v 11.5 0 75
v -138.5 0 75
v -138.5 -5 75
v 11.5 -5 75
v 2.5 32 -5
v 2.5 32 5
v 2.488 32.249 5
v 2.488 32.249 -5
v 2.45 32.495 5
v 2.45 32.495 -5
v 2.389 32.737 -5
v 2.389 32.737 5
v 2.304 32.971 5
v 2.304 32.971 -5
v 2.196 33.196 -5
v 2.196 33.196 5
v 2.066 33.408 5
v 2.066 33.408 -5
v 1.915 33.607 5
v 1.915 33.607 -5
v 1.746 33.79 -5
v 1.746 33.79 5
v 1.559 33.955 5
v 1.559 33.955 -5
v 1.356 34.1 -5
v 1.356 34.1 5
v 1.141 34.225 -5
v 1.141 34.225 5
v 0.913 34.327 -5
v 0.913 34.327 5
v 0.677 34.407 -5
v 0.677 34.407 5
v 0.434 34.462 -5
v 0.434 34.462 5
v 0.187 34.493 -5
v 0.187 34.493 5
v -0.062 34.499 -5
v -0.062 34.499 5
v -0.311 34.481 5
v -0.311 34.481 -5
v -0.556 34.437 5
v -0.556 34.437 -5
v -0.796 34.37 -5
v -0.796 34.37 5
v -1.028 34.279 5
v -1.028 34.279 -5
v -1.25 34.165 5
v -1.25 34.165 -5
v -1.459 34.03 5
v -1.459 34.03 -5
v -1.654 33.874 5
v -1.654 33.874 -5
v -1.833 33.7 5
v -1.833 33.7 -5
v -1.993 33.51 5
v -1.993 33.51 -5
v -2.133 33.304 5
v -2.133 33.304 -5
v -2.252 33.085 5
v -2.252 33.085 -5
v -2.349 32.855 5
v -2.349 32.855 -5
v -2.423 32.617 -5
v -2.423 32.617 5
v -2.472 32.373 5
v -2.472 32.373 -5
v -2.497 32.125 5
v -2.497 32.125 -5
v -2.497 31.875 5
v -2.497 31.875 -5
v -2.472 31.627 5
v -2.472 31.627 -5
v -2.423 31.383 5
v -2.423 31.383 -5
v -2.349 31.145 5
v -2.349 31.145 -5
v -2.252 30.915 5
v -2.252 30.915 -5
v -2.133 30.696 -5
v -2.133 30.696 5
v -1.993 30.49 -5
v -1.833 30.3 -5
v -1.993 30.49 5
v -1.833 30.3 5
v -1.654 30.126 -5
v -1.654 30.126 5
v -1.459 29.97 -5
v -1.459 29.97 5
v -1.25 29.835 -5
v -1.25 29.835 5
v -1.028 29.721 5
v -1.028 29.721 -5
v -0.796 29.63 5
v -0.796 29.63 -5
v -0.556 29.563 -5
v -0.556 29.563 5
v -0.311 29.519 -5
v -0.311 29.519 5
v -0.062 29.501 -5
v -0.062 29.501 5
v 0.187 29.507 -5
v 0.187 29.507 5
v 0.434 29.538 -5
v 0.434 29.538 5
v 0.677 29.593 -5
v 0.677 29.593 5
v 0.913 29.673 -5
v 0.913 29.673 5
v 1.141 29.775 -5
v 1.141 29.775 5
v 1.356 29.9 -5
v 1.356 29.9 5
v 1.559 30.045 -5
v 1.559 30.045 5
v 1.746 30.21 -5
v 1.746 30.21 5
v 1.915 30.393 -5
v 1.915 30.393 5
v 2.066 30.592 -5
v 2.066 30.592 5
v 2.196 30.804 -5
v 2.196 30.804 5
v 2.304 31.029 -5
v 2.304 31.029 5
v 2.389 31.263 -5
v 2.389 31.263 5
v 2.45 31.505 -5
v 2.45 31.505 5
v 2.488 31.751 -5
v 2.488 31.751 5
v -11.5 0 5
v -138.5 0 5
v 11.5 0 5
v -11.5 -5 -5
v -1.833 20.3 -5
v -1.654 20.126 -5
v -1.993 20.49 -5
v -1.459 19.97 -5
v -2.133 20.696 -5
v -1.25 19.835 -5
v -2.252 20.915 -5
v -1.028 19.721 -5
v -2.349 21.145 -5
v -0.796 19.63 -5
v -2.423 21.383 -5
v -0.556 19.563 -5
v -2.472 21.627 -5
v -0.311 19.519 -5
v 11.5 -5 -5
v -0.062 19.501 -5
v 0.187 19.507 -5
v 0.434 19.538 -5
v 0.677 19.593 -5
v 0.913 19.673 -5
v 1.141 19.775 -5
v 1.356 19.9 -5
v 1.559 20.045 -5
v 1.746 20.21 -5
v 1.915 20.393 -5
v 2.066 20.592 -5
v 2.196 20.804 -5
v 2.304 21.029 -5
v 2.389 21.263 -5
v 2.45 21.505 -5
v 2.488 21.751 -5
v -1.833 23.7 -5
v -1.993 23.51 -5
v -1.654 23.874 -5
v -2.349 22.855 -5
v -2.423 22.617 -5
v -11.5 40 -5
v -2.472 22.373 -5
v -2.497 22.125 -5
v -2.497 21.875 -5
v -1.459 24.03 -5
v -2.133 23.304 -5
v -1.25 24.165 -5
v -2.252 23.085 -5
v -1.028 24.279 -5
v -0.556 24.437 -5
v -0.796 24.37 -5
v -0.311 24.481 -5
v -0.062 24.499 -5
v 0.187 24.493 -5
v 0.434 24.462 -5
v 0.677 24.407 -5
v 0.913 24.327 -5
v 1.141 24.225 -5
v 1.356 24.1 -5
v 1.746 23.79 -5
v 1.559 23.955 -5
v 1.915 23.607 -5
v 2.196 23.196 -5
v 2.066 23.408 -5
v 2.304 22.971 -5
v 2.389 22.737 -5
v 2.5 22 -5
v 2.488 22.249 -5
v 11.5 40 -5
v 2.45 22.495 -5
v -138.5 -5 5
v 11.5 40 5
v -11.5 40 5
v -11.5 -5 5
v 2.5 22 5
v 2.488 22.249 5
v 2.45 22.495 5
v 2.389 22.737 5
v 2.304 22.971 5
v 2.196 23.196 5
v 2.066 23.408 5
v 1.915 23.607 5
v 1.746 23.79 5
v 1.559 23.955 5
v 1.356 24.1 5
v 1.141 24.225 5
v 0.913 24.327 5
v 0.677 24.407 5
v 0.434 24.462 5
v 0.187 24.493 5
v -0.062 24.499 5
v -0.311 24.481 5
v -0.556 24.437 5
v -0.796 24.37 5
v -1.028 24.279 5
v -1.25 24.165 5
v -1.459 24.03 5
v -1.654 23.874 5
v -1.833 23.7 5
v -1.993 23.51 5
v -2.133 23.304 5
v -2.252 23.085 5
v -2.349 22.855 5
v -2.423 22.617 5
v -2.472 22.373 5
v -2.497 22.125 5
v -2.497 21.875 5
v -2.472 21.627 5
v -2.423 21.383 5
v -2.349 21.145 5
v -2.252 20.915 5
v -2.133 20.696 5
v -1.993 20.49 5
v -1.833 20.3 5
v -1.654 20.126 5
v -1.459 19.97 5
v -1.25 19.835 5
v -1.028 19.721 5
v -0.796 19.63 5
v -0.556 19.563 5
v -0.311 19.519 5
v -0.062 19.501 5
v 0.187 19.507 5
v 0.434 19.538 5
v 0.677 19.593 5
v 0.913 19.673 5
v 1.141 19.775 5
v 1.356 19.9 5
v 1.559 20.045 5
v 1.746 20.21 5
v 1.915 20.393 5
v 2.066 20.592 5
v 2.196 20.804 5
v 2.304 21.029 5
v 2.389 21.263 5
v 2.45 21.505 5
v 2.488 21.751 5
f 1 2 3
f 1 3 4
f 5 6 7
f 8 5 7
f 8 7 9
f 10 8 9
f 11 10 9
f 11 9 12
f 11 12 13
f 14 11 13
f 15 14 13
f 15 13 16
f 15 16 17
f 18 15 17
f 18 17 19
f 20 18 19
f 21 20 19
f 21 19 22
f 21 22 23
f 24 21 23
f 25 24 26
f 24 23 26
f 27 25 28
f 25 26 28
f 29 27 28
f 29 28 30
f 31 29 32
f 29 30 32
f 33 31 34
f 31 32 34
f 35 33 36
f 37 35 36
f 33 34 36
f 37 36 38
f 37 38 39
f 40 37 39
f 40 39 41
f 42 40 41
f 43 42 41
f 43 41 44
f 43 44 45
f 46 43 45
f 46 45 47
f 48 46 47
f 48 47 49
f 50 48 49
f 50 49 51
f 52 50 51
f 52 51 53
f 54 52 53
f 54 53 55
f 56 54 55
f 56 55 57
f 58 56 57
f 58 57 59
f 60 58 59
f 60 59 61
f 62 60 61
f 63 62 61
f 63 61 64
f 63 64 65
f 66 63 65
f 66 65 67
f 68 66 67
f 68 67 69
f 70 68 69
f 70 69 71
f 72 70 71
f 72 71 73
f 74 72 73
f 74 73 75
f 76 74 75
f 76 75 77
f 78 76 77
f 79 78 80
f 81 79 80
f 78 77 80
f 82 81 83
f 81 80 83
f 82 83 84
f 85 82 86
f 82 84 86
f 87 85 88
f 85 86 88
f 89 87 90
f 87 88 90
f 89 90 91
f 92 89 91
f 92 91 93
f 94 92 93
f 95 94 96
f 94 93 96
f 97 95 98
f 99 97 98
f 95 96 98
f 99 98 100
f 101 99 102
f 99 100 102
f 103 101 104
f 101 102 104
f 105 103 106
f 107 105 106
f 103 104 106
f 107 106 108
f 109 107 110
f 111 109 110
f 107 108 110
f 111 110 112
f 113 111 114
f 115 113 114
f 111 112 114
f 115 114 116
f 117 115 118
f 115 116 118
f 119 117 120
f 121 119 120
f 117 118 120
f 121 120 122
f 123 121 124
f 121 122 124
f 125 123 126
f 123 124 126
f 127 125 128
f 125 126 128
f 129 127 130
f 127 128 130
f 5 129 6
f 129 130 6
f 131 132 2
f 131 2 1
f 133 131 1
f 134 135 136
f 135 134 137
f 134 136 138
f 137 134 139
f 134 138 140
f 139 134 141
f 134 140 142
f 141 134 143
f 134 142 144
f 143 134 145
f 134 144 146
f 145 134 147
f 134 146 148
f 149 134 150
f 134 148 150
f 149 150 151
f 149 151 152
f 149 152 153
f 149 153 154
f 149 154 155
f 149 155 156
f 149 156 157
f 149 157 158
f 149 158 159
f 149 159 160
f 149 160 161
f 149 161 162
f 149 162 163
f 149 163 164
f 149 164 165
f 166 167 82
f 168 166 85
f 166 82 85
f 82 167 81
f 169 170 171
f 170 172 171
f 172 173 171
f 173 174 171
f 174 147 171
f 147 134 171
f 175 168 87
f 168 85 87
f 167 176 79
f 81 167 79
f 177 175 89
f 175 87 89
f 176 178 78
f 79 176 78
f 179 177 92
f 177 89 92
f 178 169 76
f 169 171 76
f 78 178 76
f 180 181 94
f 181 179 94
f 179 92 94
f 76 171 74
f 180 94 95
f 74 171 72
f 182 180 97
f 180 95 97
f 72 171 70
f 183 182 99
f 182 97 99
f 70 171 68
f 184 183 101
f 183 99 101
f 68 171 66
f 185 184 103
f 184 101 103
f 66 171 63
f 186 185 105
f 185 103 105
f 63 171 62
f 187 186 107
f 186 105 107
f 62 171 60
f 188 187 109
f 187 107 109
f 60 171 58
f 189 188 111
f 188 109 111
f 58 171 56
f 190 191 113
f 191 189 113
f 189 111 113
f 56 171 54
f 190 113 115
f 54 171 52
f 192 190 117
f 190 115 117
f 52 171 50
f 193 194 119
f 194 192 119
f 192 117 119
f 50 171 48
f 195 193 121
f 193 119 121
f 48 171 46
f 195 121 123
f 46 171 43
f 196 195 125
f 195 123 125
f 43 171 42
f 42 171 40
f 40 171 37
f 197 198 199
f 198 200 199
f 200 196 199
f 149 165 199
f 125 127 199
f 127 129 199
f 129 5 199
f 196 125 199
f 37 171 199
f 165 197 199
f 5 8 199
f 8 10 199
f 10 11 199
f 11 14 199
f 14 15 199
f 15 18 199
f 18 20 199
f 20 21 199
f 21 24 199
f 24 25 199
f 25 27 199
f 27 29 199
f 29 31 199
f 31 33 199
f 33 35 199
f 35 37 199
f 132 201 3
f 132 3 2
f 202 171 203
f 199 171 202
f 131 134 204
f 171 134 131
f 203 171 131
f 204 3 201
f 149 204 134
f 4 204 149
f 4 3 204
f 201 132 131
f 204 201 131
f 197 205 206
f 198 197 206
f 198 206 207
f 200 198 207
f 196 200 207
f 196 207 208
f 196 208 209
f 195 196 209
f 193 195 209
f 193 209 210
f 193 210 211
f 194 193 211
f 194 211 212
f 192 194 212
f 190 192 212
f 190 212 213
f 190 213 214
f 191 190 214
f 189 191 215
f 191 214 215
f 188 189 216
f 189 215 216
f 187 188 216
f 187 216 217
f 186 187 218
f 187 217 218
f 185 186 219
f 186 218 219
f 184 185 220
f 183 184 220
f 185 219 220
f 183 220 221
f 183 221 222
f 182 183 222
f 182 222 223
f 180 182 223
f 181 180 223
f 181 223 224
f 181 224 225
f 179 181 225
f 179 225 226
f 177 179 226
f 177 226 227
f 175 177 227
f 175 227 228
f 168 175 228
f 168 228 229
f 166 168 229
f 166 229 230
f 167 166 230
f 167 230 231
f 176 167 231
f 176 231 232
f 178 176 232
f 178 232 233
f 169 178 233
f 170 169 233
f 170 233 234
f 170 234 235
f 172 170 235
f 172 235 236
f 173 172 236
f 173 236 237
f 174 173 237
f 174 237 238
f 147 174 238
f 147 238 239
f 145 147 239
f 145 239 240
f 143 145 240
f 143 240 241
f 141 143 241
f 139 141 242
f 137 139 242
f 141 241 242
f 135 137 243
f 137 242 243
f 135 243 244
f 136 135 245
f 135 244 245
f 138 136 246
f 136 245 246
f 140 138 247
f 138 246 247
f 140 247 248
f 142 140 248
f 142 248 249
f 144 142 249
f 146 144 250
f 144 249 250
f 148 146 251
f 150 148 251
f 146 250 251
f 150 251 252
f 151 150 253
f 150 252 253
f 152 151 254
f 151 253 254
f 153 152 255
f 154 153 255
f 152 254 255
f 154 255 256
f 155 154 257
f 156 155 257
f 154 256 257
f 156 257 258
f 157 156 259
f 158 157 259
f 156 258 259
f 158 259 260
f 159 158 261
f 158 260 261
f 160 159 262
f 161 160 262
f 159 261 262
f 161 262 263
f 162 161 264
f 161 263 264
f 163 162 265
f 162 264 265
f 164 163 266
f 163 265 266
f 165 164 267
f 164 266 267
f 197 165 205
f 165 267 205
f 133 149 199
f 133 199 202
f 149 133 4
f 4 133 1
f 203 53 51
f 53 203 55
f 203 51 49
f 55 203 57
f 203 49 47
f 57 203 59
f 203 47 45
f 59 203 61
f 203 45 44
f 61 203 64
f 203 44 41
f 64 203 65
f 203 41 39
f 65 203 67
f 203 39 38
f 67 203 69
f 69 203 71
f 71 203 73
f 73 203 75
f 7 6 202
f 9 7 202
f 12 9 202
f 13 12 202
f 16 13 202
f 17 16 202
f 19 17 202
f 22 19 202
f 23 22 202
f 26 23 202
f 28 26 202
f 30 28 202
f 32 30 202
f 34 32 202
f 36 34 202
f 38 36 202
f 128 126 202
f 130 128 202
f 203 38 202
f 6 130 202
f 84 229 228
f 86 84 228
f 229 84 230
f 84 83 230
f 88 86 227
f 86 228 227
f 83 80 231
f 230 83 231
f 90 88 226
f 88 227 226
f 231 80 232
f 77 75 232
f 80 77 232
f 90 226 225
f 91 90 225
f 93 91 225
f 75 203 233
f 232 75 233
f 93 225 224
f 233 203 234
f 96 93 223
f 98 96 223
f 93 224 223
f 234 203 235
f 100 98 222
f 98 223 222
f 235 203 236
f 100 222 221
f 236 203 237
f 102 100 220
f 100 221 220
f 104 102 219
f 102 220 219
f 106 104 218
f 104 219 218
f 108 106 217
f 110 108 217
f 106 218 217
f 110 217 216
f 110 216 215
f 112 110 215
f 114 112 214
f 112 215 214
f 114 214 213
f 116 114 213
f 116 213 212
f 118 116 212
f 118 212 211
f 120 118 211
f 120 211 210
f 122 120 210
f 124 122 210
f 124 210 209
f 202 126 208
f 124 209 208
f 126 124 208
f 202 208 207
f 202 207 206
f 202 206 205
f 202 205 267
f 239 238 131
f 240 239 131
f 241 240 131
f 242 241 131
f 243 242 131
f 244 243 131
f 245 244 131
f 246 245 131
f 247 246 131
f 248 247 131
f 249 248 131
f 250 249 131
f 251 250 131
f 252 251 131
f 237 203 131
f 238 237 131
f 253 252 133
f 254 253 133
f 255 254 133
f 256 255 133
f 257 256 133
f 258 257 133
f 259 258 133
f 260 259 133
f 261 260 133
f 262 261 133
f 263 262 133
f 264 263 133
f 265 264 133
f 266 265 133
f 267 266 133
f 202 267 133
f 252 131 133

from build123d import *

# Parameters (mm, degrees)
SKETCH2_W           = 23
SKETCH2_H           = 10
BOSS_EXTRUDE1_DEPTH = 40
SKETCH3_R           = 2.5
CUT_EXTRUDE1_DEPTH  = 43.804789452
SKETCH4_W           = 150
SKETCH4_H           = 5
BOSS_EXTRUDE2_DEPTH = 70
SKETCH5_W           = 23
SKETCH5_H           = 10
BOSS_EXTRUDE3_DEPTH = 5


with BuildPart() as part:
    # Sketch2 → Boss-Extrude1 (new body)
    with BuildSketch(Plane(origin=(0, 0, 0), x_dir=(1, 0, 0), z_dir=(0, 1, 0))):
        Rectangle(SKETCH2_W, SKETCH2_H)
    extrude(amount=BOSS_EXTRUDE1_DEPTH)

    # Sketch3 → Cut-Extrude1 (cut, through all)
    with BuildSketch(Plane.XY.offset(5)):
        with Locations((0, 32)):
            Circle(SKETCH3_R)
        with Locations((0, 22)):
            Circle(SKETCH3_R)
    extrude(amount=-CUT_EXTRUDE1_DEPTH, mode=Mode.SUBTRACT)



with BuildPart() as body_2:
    # Sketch4 → Boss-Extrude2 (new body)
    with BuildSketch(Plane.XY.offset(5)):
        with Locations((-63.5, -2.5)):
            Rectangle(SKETCH4_W, SKETCH4_H)
    extrude(amount=BOSS_EXTRUDE2_DEPTH)


with BuildPart() as part_1:
    add(part.part)

    add(body_2.part)  # Boss-Extrude3 merges body 2
    # Sketch5 → Boss-Extrude3 (add)
    with BuildSketch(Plane.XZ):
        Rectangle(SKETCH5_W, SKETCH5_H)
    extrude(amount=BOSS_EXTRUDE3_DEPTH)


solid = part_1.part
